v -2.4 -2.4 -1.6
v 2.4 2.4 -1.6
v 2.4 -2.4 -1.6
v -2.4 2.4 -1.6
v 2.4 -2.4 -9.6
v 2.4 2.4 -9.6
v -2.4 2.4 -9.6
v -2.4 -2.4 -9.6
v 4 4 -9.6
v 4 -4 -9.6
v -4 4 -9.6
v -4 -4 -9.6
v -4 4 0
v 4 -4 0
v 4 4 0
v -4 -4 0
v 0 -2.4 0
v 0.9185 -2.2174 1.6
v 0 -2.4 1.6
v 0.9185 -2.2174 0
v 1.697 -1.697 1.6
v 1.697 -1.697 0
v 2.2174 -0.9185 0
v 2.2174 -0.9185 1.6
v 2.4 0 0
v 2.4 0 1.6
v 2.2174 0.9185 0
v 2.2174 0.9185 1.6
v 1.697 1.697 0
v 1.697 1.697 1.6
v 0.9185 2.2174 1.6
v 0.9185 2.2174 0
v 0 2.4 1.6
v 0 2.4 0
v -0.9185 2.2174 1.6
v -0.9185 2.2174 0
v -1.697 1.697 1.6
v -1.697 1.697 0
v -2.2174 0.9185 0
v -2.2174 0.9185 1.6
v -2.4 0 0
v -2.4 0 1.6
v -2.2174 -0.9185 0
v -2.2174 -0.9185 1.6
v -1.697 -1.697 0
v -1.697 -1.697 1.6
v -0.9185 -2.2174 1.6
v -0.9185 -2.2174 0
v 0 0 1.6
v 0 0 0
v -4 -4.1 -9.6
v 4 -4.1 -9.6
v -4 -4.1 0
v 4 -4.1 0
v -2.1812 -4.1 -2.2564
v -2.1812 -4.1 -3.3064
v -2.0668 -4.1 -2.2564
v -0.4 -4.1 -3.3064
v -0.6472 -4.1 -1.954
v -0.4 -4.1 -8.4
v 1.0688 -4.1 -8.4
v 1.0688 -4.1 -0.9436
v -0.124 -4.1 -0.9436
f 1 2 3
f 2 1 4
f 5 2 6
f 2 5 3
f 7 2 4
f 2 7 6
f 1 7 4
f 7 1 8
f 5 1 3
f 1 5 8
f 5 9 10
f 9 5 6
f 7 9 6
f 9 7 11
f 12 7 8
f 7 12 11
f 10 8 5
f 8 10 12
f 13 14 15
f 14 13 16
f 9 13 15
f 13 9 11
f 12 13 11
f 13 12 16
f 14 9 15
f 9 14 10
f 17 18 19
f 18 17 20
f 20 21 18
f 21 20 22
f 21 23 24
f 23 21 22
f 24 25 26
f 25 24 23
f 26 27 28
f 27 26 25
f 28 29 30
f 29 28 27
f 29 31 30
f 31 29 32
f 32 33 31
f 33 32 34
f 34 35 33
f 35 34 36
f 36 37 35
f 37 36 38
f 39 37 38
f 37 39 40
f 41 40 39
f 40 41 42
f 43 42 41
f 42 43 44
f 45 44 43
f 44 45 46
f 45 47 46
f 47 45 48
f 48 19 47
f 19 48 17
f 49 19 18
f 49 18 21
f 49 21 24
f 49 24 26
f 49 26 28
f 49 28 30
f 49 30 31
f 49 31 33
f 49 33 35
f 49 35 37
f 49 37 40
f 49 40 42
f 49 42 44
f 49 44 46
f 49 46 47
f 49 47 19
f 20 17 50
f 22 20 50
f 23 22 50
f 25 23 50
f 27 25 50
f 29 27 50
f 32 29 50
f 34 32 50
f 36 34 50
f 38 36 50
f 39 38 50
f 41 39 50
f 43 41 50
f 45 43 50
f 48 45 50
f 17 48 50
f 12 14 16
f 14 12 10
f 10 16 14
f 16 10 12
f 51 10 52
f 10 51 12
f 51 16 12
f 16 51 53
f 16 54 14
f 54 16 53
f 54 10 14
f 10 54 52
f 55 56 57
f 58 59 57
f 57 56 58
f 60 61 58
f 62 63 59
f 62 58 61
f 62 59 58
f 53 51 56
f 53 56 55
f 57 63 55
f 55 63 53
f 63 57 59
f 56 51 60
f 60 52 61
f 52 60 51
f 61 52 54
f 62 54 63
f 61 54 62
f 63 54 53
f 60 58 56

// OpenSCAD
// file: ../p/4-4edge.scad
use <../lib.scad>
function ldraw_lib__4_4edge() = [
// 0 Circle 1.0
// 0 Name: 4-4edge.dat
// 0 Author: James Jessiman
// 0 !LDRAW_ORG Primitive UPDATE 2017-01
// 0 !LICENSE Licensed under CC BY 2.0 and CC BY 4.0 : see CAreadme.txt
// 
// 0 BFC CERTIFY CCW
  [0,"BFC","CERTIFY"],
  [0,"BFC","CCW"],
// 
// 0 !HISTORY 1998-12-15 [PTadmin] Official Update 1998-10
// 0 !HISTORY 2005-12-28 [PTadmin] Official Update 2005-01
// 0 !HISTORY 2007-06-24 [PTadmin] Header formatted for Contributor Agreement
// 0 !HISTORY 2008-07-01 [PTadmin] Official Update 2008-01
// 0 !HISTORY 2017-01-15 [Steffen] BFCed
// 0 !HISTORY 2017-12-30 [PTadmin] Official Update 2017-01
// 
// 
// 2 24 1 0 0 0.9239 0 0.3827
  [2,24,1,0,0,0.9239,0,0.3827],
// 2 24 0.9239 0 0.3827 0.7071 0 0.7071
  [2,24,0.9239,0,0.3827,0.7071,0,0.7071],
// 2 24 0.7071 0 0.7071 0.3827 0 0.9239
  [2,24,0.7071,0,0.7071,0.3827,0,0.9239],
// 2 24 0.3827 0 0.9239 0 0 1
  [2,24,0.3827,0,0.9239,0,0,1],
// 2 24 0 0 1 -0.3827 0 0.9239
  [2,24,0,0,1,-0.3827,0,0.9239],
// 2 24 -0.3827 0 0.9239 -0.7071 0 0.7071
  [2,24,-0.3827,0,0.9239,-0.7071,0,0.7071],
// 2 24 -0.7071 0 0.7071 -0.9239 0 0.3827
  [2,24,-0.7071,0,0.7071,-0.9239,0,0.3827],
// 2 24 -0.9239 0 0.3827 -1 0 -0
  [2,24,-0.9239,0,0.3827,-1,0,-0],
// 2 24 -1 0 -0 -0.9239 0 -0.3827
  [2,24,-1,0,-0,-0.9239,0,-0.3827],
// 2 24 -0.9239 0 -0.3827 -0.7071 0 -0.7071
  [2,24,-0.9239,0,-0.3827,-0.7071,0,-0.7071],
// 2 24 -0.7071 0 -0.7071 -0.3827 0 -0.9239
  [2,24,-0.7071,0,-0.7071,-0.3827,0,-0.9239],
// 2 24 -0.3827 0 -0.9239 0 0 -1
  [2,24,-0.3827,0,-0.9239,0,0,-1],
// 2 24 0 0 -1 0.3827 0 -0.9239
  [2,24,0,0,-1,0.3827,0,-0.9239],
// 2 24 0.3827 0 -0.9239 0.7071 0 -0.7071
  [2,24,0.3827,0,-0.9239,0.7071,0,-0.7071],
// 2 24 0.7071 0 -0.7071 0.9239 0 -0.3827
  [2,24,0.7071,0,-0.7071,0.9239,0,-0.3827],
// 2 24 0.9239 0 -0.3827 1 0 0
  [2,24,0.9239,0,-0.3827,1,0,0],
];
module ldraw_lib__4_4edge(step=0, col=false, unit=2/5, alt=false, line=0.2, solid=!$preview)
    makepoly(ldraw_lib__4_4edge(), step=step, col=col, unit=unit, alt=alt, line=line, solid=solid);
ldraw_lib__4_4edge(line=0.2);
// file: ../p/4-4disc.scad
use <../lib.scad>
function ldraw_lib__4_4disc() = [
// 0 Disc 1.0
// 0 Name: 4-4disc.dat
// 0 Author: James Jessiman
// 0 !LDRAW_ORG Primitive UPDATE 2002-02
// 0 !LICENSE Licensed under CC BY 2.0 and CC BY 4.0 : see CAreadme.txt
// 
// 0 BFC CERTIFY CCW
  [0,"BFC","CERTIFY"],
  [0,"BFC","CCW"],
// 
// 0 !HISTORY 1998-12-15 [PTadmin] Official Update 1998-10
// 0 !HISTORY 2002-03-23 [sbliss] Added BFC statement
// 0 !HISTORY 2002-04-25 [PTadmin] Official Update 2002-02
// 0 !HISTORY 2007-06-24 [PTadmin] Header formatted for Contributor Agreement
// 0 !HISTORY 2008-07-01 [PTadmin] Official Update 2008-01
// 
// 
// 3 16 0 0 0 1 0 0 0.9239 0 0.3827
  [3,16,0,0,0,1,0,0,0.9239,0,0.3827],
// 3 16 0 0 0 0.9239 0 0.3827 0.7071 0 0.7071
  [3,16,0,0,0,0.9239,0,0.3827,0.7071,0,0.7071],
// 3 16 0 0 0 0.7071 0 0.7071 0.3827 0 0.9239
  [3,16,0,0,0,0.7071,0,0.7071,0.3827,0,0.9239],
// 3 16 0 0 0 0.3827 0 0.9239 0 0 1
  [3,16,0,0,0,0.3827,0,0.9239,0,0,1],
// 3 16 0 0 0 0 0 1 -0.3827 0 0.9239
  [3,16,0,0,0,0,0,1,-0.3827,0,0.9239],
// 3 16 0 0 0 -0.3827 0 0.9239 -0.7071 0 0.7071
  [3,16,0,0,0,-0.3827,0,0.9239,-0.7071,0,0.7071],
// 3 16 0 0 0 -0.7071 0 0.7071 -0.9239 0 0.3827
  [3,16,0,0,0,-0.7071,0,0.7071,-0.9239,0,0.3827],
// 3 16 0 0 0 -0.9239 0 0.3827 -1 0 -0
  [3,16,0,0,0,-0.9239,0,0.3827,-1,0,-0],
// 3 16 0 0 0 -1 0 -0 -0.9239 0 -0.3827
  [3,16,0,0,0,-1,0,-0,-0.9239,0,-0.3827],
// 3 16 0 0 0 -0.9239 0 -0.3827 -0.7071 0 -0.7071
  [3,16,0,0,0,-0.9239,0,-0.3827,-0.7071,0,-0.7071],
// 3 16 0 0 0 -0.7071 0 -0.7071 -0.3827 0 -0.9239
  [3,16,0,0,0,-0.7071,0,-0.7071,-0.3827,0,-0.9239],
// 3 16 0 0 0 -0.3827 0 -0.9239 0 0 -1
  [3,16,0,0,0,-0.3827,0,-0.9239,0,0,-1],
// 3 16 0 0 0 0 0 -1 0.3827 0 -0.9239
  [3,16,0,0,0,0,0,-1,0.3827,0,-0.9239],
// 3 16 0 0 0 0.3827 0 -0.9239 0.7071 0 -0.7071
  [3,16,0,0,0,0.3827,0,-0.9239,0.7071,0,-0.7071],
// 3 16 0 0 0 0.7071 0 -0.7071 0.9239 0 -0.3827
  [3,16,0,0,0,0.7071,0,-0.7071,0.9239,0,-0.3827],
// 3 16 0 0 0 0.9239 0 -0.3827 1 0 0
  [3,16,0,0,0,0.9239,0,-0.3827,1,0,0],
// 0
];
module ldraw_lib__4_4disc(step=0, col=false, unit=2/5, alt=false, line=0.2, solid=!$preview)
    makepoly(ldraw_lib__4_4disc(), step=step, col=col, unit=unit, alt=alt, line=line, solid=solid);
ldraw_lib__4_4disc(line=0.2);
// file: ../p/4-4cyli.scad
use <../lib.scad>
$fa=1; $fs=0.2;
function ldraw_lib__4_4cyli(realsolid=false) = [
// 0 Cylinder 1.0
// 0 Name: 4-4cyli.dat
// 0 Author: James Jessiman
// 0 !LDRAW_ORG Primitive UPDATE 2005-01
// 0 !LICENSE Licensed under CC BY 2.0 and CC BY 4.0 : see CAreadme.txt
// 
// 0 BFC CERTIFY CCW
  [0,"BFC","CERTIFY"],
  [0,"BFC","CCW"],
// 
// 0 !HISTORY 1998-12-15 [PTadmin] Official Update 1998-10
// 0 !HISTORY 2002-03-23 [sbliss] Added BFC statement; merged headers from files in distributions LDraw 0.27 and Complete.
// 0 !HISTORY 2002-04-25 [PTadmin] Official Update 2002-02
// 0 !HISTORY 2004-12-14 [guyvivan] BFC CCW
// 0 !HISTORY 2005-12-28 [PTadmin] Official Update 2005-01
// 0 !HISTORY 2007-06-24 [PTadmin] Header formatted for Contributor Agreement
// 0 !HISTORY 2008-07-01 [PTadmin] Official Update 2008-01
// 
// 
// 4 16 1 1 0 0.9239 1 0.3827 0.9239 0 0.3827 1 0 0
  [4,16,1,1,0,0.9239,1,0.3827,0.9239,0,0.3827,1,0,0],
// 5 24 1 0 0 1 1 0 0.9239 0 0.3827 0.9239 0 -0.3827
  [5,24,1,0,0,1,1,0,0.9239,0,0.3827,0.9239,0,-0.3827],
// 4 16 0.9239 1 0.3827 0.7071 1 0.7071 0.7071 0 0.7071 0.9239 0 0.3827
  [4,16,0.9239,1,0.3827,0.7071,1,0.7071,0.7071,0,0.7071,0.9239,0,0.3827],
// 5 24 0.9239 0 0.3827 0.9239 1 0.3827 0.7071 0 0.7071 1 0 0
  [5,24,0.9239,0,0.3827,0.9239,1,0.3827,0.7071,0,0.7071,1,0,0],
// 4 16 0.7071 1 0.7071 0.3827 1 0.9239 0.3827 0 0.9239 0.7071 0 0.7071
  [4,16,0.7071,1,0.7071,0.3827,1,0.9239,0.3827,0,0.9239,0.7071,0,0.7071],
// 5 24 0.7071 0 0.7071 0.7071 1 0.7071 0.3827 0 0.9239 0.9239 0 0.3827
  [5,24,0.7071,0,0.7071,0.7071,1,0.7071,0.3827,0,0.9239,0.9239,0,0.3827],
// 4 16 0.3827 1 0.9239 0 1 1 0 0 1 0.3827 0 0.9239
  [4,16,0.3827,1,0.9239,0,1,1,0,0,1,0.3827,0,0.9239],
// 5 24 0.3827 0 0.9239 0.3827 1 0.9239 0 0 1 0.7071 0 0.7071
  [5,24,0.3827,0,0.9239,0.3827,1,0.9239,0,0,1,0.7071,0,0.7071],
// 4 16 0 1 1 -0.3827 1 0.9239 -0.3827 0 0.9239 0 0 1
  [4,16,0,1,1,-0.3827,1,0.9239,-0.3827,0,0.9239,0,0,1],
// 5 24 0 0 1 0 1 1 -0.3827 0 0.9239 0.3827 0 0.9239
  [5,24,0,0,1,0,1,1,-0.3827,0,0.9239,0.3827,0,0.9239],
// 4 16 -0.3827 1 0.9239 -0.7071 1 0.7071 -0.7071 0 0.7071 -0.3827 0 0.9239
  [4,16,-0.3827,1,0.9239,-0.7071,1,0.7071,-0.7071,0,0.7071,-0.3827,0,0.9239],
// 5 24 -0.3827 0 0.9239 -0.3827 1 0.9239 -0.7071 0 0.7071 0 0 1
  [5,24,-0.3827,0,0.9239,-0.3827,1,0.9239,-0.7071,0,0.7071,0,0,1],
// 4 16 -0.7071 1 0.7071 -0.9239 1 0.3827 -0.9239 0 0.3827 -0.7071 0 0.7071
  [4,16,-0.7071,1,0.7071,-0.9239,1,0.3827,-0.9239,0,0.3827,-0.7071,0,0.7071],
// 5 24 -0.7071 0 0.7071 -0.7071 1 0.7071 -0.9239 0 0.3827 -0.3827 0 0.9239
  [5,24,-0.7071,0,0.7071,-0.7071,1,0.7071,-0.9239,0,0.3827,-0.3827,0,0.9239],
// 4 16 -0.9239 1 0.3827 -1 1 0 -1 0 0 -0.9239 0 0.3827
  [4,16,-0.9239,1,0.3827,-1,1,0,-1,0,0,-0.9239,0,0.3827],
// 5 24 -0.9239 0 0.3827 -0.9239 1 0.3827 -1 0 0 -0.7071 0 0.7071
  [5,24,-0.9239,0,0.3827,-0.9239,1,0.3827,-1,0,0,-0.7071,0,0.7071],
// 4 16 -1 1 0 -0.9239 1 -0.3827 -0.9239 0 -0.3827 -1 0 0
  [4,16,-1,1,0,-0.9239,1,-0.3827,-0.9239,0,-0.3827,-1,0,0],
// 5 24 -1 0 0 -1 1 0 -0.9239 0 -0.3827 -0.9239 0 0.3827
  [5,24,-1,0,0,-1,1,0,-0.9239,0,-0.3827,-0.9239,0,0.3827],
// 4 16 -0.9239 1 -0.3827 -0.7071 1 -0.7071 -0.7071 0 -0.7071 -0.9239 0 -0.3827
  [4,16,-0.9239,1,-0.3827,-0.7071,1,-0.7071,-0.7071,0,-0.7071,-0.9239,0,-0.3827],
// 5 24 -0.9239 0 -0.3827 -0.9239 1 -0.3827 -0.7071 0 -0.7071 -1 0 0
  [5,24,-0.9239,0,-0.3827,-0.9239,1,-0.3827,-0.7071,0,-0.7071,-1,0,0],
// 4 16 -0.7071 1 -0.7071 -0.3827 1 -0.9239 -0.3827 0 -0.9239 -0.7071 0 -0.7071
  [4,16,-0.7071,1,-0.7071,-0.3827,1,-0.9239,-0.3827,0,-0.9239,-0.7071,0,-0.7071],
// 5 24 -0.7071 0 -0.7071 -0.7071 1 -0.7071 -0.3827 0 -0.9239 -0.9239 0 -0.3827
  [5,24,-0.7071,0,-0.7071,-0.7071,1,-0.7071,-0.3827,0,-0.9239,-0.9239,0,-0.3827],
// 4 16 -0.3827 1 -0.9239 0 1 -1 0 0 -1 -0.3827 0 -0.9239
  [4,16,-0.3827,1,-0.9239,0,1,-1,0,0,-1,-0.3827,0,-0.9239],
// 5 24 -0.3827 0 -0.9239 -0.3827 1 -0.9239 0 0 -1 -0.7071 0 -0.7071
  [5,24,-0.3827,0,-0.9239,-0.3827,1,-0.9239,0,0,-1,-0.7071,0,-0.7071],
// 4 16 0 1 -1 0.3827 1 -0.9239 0.3827 0 -0.9239 0 0 -1
  [4,16,0,1,-1,0.3827,1,-0.9239,0.3827,0,-0.9239,0,0,-1],
// 5 24 0 0 -1 0 1 -1 0.3827 0 -0.9239 -0.3827 0 -0.9239
  [5,24,0,0,-1,0,1,-1,0.3827,0,-0.9239,-0.3827,0,-0.9239],
// 4 16 0.3827 1 -0.9239 0.7071 1 -0.7071 0.7071 0 -0.7071 0.3827 0 -0.9239
  [4,16,0.3827,1,-0.9239,0.7071,1,-0.7071,0.7071,0,-0.7071,0.3827,0,-0.9239],
// 5 24 0.3827 0 -0.9239 0.3827 1 -0.9239 0.7071 0 -0.7071 0 0 -1
  [5,24,0.3827,0,-0.9239,0.3827,1,-0.9239,0.7071,0,-0.7071,0,0,-1],
// 4 16 0.7071 1 -0.7071 0.9239 1 -0.3827 0.9239 0 -0.3827 0.7071 0 -0.7071
  [4,16,0.7071,1,-0.7071,0.9239,1,-0.3827,0.9239,0,-0.3827,0.7071,0,-0.7071],
// 5 24 0.7071 0 -0.7071 0.7071 1 -0.7071 0.9239 0 -0.3827 0.3827 0 -0.9239
  [5,24,0.7071,0,-0.7071,0.7071,1,-0.7071,0.9239,0,-0.3827,0.3827,0,-0.9239],
// 4 16 0.9239 1 -0.3827 1 1 0 1 0 0 0.9239 0 -0.3827
  [4,16,0.9239,1,-0.3827,1,1,0,1,0,0,0.9239,0,-0.3827],
// 5 24 0.9239 0 -0.3827 0.9239 1 -0.3827 1 0 0 0.7071 0 -0.7071
  [5,24,0.9239,0,-0.3827,0.9239,1,-0.3827,1,0,0,0.7071,0,-0.7071],
// 0
];
module ldraw_lib__4_4cyli(step=0, col=false, unit=2/5, alt=false, line=0.2, solid=!$preview)
    makepoly(ldraw_lib__4_4cyli(solid), step=step, col=col, unit=unit, alt=alt, line=line, solid=solid);
ldraw_lib__4_4cyli(line=0.2);
// file: ../p/stud.scad
use <../lib.scad>
use <4-4cyli.scad>
use <4-4disc.scad>
use <4-4edge.scad>
function ldraw_lib__stud() = [
// 0 Stud
// 0 Name: stud.dat
// 0 Author: James Jessiman
// 0 !LDRAW_ORG Primitive UPDATE 2012-01
// 0 !LICENSE Licensed under CC BY 4.0 : see CAreadme.txt
// 
// 0 BFC CERTIFY CCW
  [0,"BFC","CERTIFY"],
  [0,"BFC","CCW"],
// 
// 0 !HISTORY 2002-04-04 [sbliss] Modified for BFC compliance
// 0 !HISTORY 2002-04-25 [PTadmin] Official Update 2002-02
// 0 !HISTORY 2007-06-24 [PTadmin] Header formatted for Contributor Agreement
// 0 !HISTORY 2008-07-01 [PTadmin] Official Update 2008-01
// 0 !HISTORY 2012-02-16 [Philo] Changed to CCW
// 0 !HISTORY 2012-03-30 [PTadmin] Official Update 2012-01
// 
// 
// 1 16 0 0 0 6 0 0 0 1 0 0 0 6 4-4edge.dat
  [1,16,0,0,0,6,0,0,0,1,0,0,0,6, ldraw_lib__4_4edge()],
// 1 16 0 -4 0 6 0 0 0 1 0 0 0 6 4-4edge.dat
  [1,16,0,-4,0,6,0,0,0,1,0,0,0,6, ldraw_lib__4_4edge()],
// 1 16 0 0 0 6 0 0 0 -4 0 0 0 6 4-4cyli.dat
  [1,16,0,0,0,6,0,0,0,-4,0,0,0,6, ldraw_lib__4_4cyli()],
// 1 16 0 -4 0 6 0 0 0 1 0 0 0 6 4-4disc.dat
  [1,16,0,-4,0,6,0,0,0,1,0,0,0,6, ldraw_lib__4_4disc()],
  [-1,16,0,0,0,6,0,0,0,-1,0,0,0,6, ldraw_lib__4_4disc()],
];
module ldraw_lib__stud(step=0, col=false, unit=2/5, alt=false, line=0.2, solid=!$preview)
    makepoly(ldraw_lib__stud(), step=step, col=col, unit=unit, alt=alt, line=line, solid=solid);
ldraw_lib__stud(line=0.2);
// file: ../p/box5.scad
use <../lib.scad>
function ldraw_lib__box5() = [
// 0 Box with 5 Faces and All Edges
// 0 Name: box5.dat
// 0 Author: James Jessiman
// 0 !LDRAW_ORG Primitive UPDATE 2012-01
// 0 !LICENSE Licensed under CC BY 2.0 and CC BY 4.0 : see CAreadme.txt
// 
// 0 BFC CERTIFY CCW
  [0,"BFC","CERTIFY"],
  [0,"BFC","CCW"],
// 
// 0 !HISTORY 2002-04-03 [sbliss] Modified for BFC compliance
// 0 !HISTORY 2002-04-25 [PTadmin] Official Update 2002-02
// 0 !HISTORY 2007-06-24 [PTadmin] Header formatted for Contributor Agreement
// 0 !HISTORY 2008-07-01 [PTadmin] Official Update 2008-01
// 0 !HISTORY 2012-02-16 [Philo] Changed to CCW
// 0 !HISTORY 2012-03-30 [PTadmin] Official Update 2012-01
// 
// 
// 2 24 1 1 1 -1 1 1
  [2,24,1,1,1,-1,1,1],
// 2 24 -1 1 1 -1 1 -1
  [2,24,-1,1,1,-1,1,-1],
// 2 24 -1 1 -1 1 1 -1
  [2,24,-1,1,-1,1,1,-1],
// 2 24 1 1 -1 1 1 1
  [2,24,1,1,-1,1,1,1],
// 2 24 1 0 1 -1 0 1
  [2,24,1,0,1,-1,0,1],
// 2 24 -1 0 1 -1 0 -1
  [2,24,-1,0,1,-1,0,-1],
// 2 24 -1 0 -1 1 0 -1
  [2,24,-1,0,-1,1,0,-1],
// 2 24 1 0 -1 1 0 1
  [2,24,1,0,-1,1,0,1],
// 2 24 1 0 1 1 1 1
  [2,24,1,0,1,1,1,1],
// 2 24 -1 0 1 -1 1 1
  [2,24,-1,0,1,-1,1,1],
// 2 24 1 0 -1 1 1 -1
  [2,24,1,0,-1,1,1,-1],
// 2 24 -1 0 -1 -1 1 -1
  [2,24,-1,0,-1,-1,1,-1],
// 4 16 -1 1 1 1 1 1 1 1 -1 -1 1 -1
  [4,16,-1,1,1,1,1,1,1,1,-1,-1,1,-1],
// 4 16 -1 1 1 -1 0 1 1 0 1 1 1 1
  [4,16,-1,1,1,-1,0,1,1,0,1,1,1,1],
// 4 16 -1 1 -1 -1 0 -1 -1 0 1 -1 1 1
  [4,16,-1,1,-1,-1,0,-1,-1,0,1,-1,1,1],
// 4 16 1 1 -1 1 0 -1 -1 0 -1 -1 1 -1
  [4,16,1,1,-1,1,0,-1,-1,0,-1,-1,1,-1],
// 4 16 1 1 1 1 0 1 1 0 -1 1 1 -1
  [4,16,1,1,1,1,0,1,1,0,-1,1,1,-1],
];
makepoly(ldraw_lib__box5(), line=0.2);
// file: ../p/box4t.scad
use <../lib.scad>
function ldraw_lib__box4t() = [
// 0 Box with 4 Adjacent Faces and All Edges
// 0 Name: box4t.dat
// 0 Author: Tore Eriksson [Tore_Eriksson]
// 0 !LDRAW_ORG Primitive UPDATE 2003-02
// 0 !LICENSE Licensed under CC BY 2.0 and CC BY 4.0 : see CAreadme.txt
// 
// 0 BFC CERTIFY CCW
  [0,"BFC","CERTIFY"],
  [0,"BFC","CCW"],
// 
// 0 !HISTORY 1997-09-29 [PTadmin] Official Update 1997-15
// 0 !HISTORY 2002-08-31 [izanette] Modified with WINDZ for BFC compliance
// 0 !HISTORY 2003-08-01 [PTadmin] Official Update 2003-02
// 0 !HISTORY 2007-06-24 [PTadmin] Header formatted for Contributor Agreement
// 0 !HISTORY 2008-07-01 [PTadmin] Official Update 2008-01
// 
// 
// 2 24 1 1 1 -1 1 1
  [2,24,1,1,1,-1,1,1],
// 2 24 -1 1 1 -1 1 -1
  [2,24,-1,1,1,-1,1,-1],
// 2 24 -1 1 -1 1 1 -1
  [2,24,-1,1,-1,1,1,-1],
// 2 24 1 1 -1 1 1 1
  [2,24,1,1,-1,1,1,1],
// 2 24 1 0 1 -1 0 1
  [2,24,1,0,1,-1,0,1],
// 2 24 -1 0 1 -1 0 -1
  [2,24,-1,0,1,-1,0,-1],
// 2 24 -1 0 -1 1 0 -1
  [2,24,-1,0,-1,1,0,-1],
// 2 24 1 0 -1 1 0 1
  [2,24,1,0,-1,1,0,1],
// 2 24 1 0 1 1 1 1
  [2,24,1,0,1,1,1,1],
// 2 24 -1 0 1 -1 1 1
  [2,24,-1,0,1,-1,1,1],
// 2 24 1 0 -1 1 1 -1
  [2,24,1,0,-1,1,1,-1],
// 2 24 -1 0 -1 -1 1 -1
  [2,24,-1,0,-1,-1,1,-1],
// 4 16 1 1 1 1 1 -1 -1 1 -1 -1 1 1
  [4,16,1,1,1,1,1,-1,-1,1,-1,-1,1,1],
// 4 16 1 1 1 -1 1 1 -1 0 1 1 0 1
  [4,16,1,1,1,-1,1,1,-1,0,1,1,0,1],
// 4 16 -1 1 1 -1 1 -1 -1 0 -1 -1 0 1
  [4,16,-1,1,1,-1,1,-1,-1,0,-1,-1,0,1],
// 0 4 16 -1 1 -1 -1 0 -1 1 0 -1 1 1 -1
// 4 16 1 1 -1 1 1 1 1 0 1 1 0 -1
  [4,16,1,1,-1,1,1,1,1,0,1,1,0,-1],
// 0
];
makepoly(ldraw_lib__box4t(), line=0.2);
// file: s/3005s01.scad
use <../../lib.scad>
use <../../p/box4t.scad>
use <../../p/box5.scad>
use <../../p/stud.scad>
function ldraw_lib__s__3005s01() = [
// 0 ~Brick  1 x  1 without Front Face
// 0 Name: s\3005s01.dat
// 0 Author: John Riley [jriley]
// 0 !LDRAW_ORG Subpart UPDATE 2004-01
// 0 !LICENSE Licensed under CC BY 2.0 and CC BY 4.0 : see CAreadme.txt
// 
// 0 BFC CERTIFY CCW
  [0,"BFC","CERTIFY"],
  [0,"BFC","CCW"],
// 
// 0 !HISTORY 2003-09-07 [jriley] BFCed & Subfiled
// 0 !HISTORY 2004-03-02 [PTadmin] Official Update 2004-01
// 0 !HISTORY 2007-08-29 [PTadmin] Header formatted for Contributor Agreement
// 0 !HISTORY 2008-07-01 [PTadmin] Official Update 2008-01
// 
// 
// 0 BFC INVERTNEXT
  [0,"BFC","INVERTNEXT"],
// 1 16 0 24 0 0 0 6 0 -20 0 -6 0 0 box5.dat
  [1,16,0,24,0,0,0,6,0,-20,0,-6,0,0, ldraw_lib__box5()],
// 4 16 10 24 -10 6 24 -6 6 24 6 10 24 10
  [4,16,10,24,-10,6,24,-6,6,24,6,10,24,10],
// 4 16 10 24 10 6 24 6 -6 24 6 -10 24 10
  [4,16,10,24,10,6,24,6,-6,24,6,-10,24,10],
// 4 16 -10 24 10 -6 24 6 -6 24 -6 -10 24 -10
  [4,16,-10,24,10,-6,24,6,-6,24,-6,-10,24,-10],
// 4 16 -10 24 -10 -6 24 -6 6 24 -6 10 24 -10
  [4,16,-10,24,-10,-6,24,-6,6,24,-6,10,24,-10],
// 1 16 0 24 0 10 0 0 0 -24 0 0 0 10 box4t.dat
  [1,16,0,24,0,10,0,0,0,-24,0,0,0,10, ldraw_lib__box4t()],
// 1 16 0 0 0 0 0 1 0 1 0 -1 0 0 stud.dat
  [1,16,0,0,0,0,0,1,0,1,0,-1,0,0, ldraw_lib__stud()],
// 0
];
module ldraw_lib__s__3005s01(step=0, col=false, unit=2/5, alt=false, line=0.2, solid=!$preview)
    makepoly(ldraw_lib__s__3005s01(), step=step, col=col, unit=unit, alt=alt, line=line, solid=solid);
ldraw_lib__s__3005s01(line=0.2);
// file: ../p/box5-12.scad
use <../lib.scad>
function ldraw_lib__box5_12() = [
// 0 Box with 5 Faces without Any Edges
// 0 Name: box5-12.dat
// 0 Author: Chris Dee [cwdee]
// 0 !LDRAW_ORG Primitive UPDATE 2009-02
// 0 !LICENSE Licensed under CC BY 2.0 and CC BY 4.0 : see CAreadme.txt
// 
// 0 BFC CERTIFY CCW
  [0,"BFC","CERTIFY"],
  [0,"BFC","CCW"],
// 
// 0 !HISTORY 2009-09-03 [PTadmin] Official Update 2009-02
// 
// 
// 4 16 1 1 1 1 1 -1 -1 1 -1 -1 1 1
  [4,16,1,1,1,1,1,-1,-1,1,-1,-1,1,1],
// 4 16 -1 0 1 1 0 1 1 1 1 -1 1 1
  [4,16,-1,0,1,1,0,1,1,1,1,-1,1,1],
// 4 16 -1 0 -1 -1 0 1 -1 1 1 -1 1 -1
  [4,16,-1,0,-1,-1,0,1,-1,1,1,-1,1,-1],
// 4 16 1 0 -1 -1 0 -1 -1 1 -1 1 1 -1
  [4,16,1,0,-1,-1,0,-1,-1,1,-1,1,1,-1],
// 4 16 1 0 1 1 0 -1 1 1 -1 1 1 1
  [4,16,1,0,1,1,0,-1,1,1,-1,1,1,1],
// 0
];
module ldraw_lib__box5_12(step=0, col=false, unit=2/5, alt=false, line=0.2, solid=!$preview)
    makepoly(ldraw_lib__box5_12(), step=step, col=col, unit=unit, alt=alt, line=line, solid=solid);
ldraw_lib__box5_12(line=0.2);
// file: 3005.scad
use <../lib.scad>
use <s/3005s01.scad>
function ldraw_lib__3005() = [
// 0 Brick  1 x  1
// 0 Name: 3005.dat
// 0 Author: James Jessiman
// 0 !LDRAW_ORG Part UPDATE 2022-05
// 0 !LICENSE Licensed under CC BY 2.0 and CC BY 4.0 : see CAreadme.txt
// 
// 0 BFC CERTIFY CCW
  [0,"BFC","CERTIFY"],
  [0,"BFC","CCW"],
// 
// 0 !HISTORY 2001-10-26 [PTadmin] Official Update 2001-01
// 0 !HISTORY 2002-05-07 {unknown} BFC Certification
// 0 !HISTORY 2002-06-11 [PTadmin] Official Update 2002-03
// 0 !HISTORY 2007-05-07 [PTadmin] Header formatted for Contributor Agreement
// 0 !HISTORY 2008-07-01 [PTadmin] Official Update 2008-01
// 0 !HISTORY 2022-08-04 [MagFors] Using subfile
// 0 !HISTORY 2022-09-15 [PTadmin] Official Update 2022-05
// 
// 
// 1 16 0 0 0 1 0 0 0 1 0 0 0 1 s\3005s01.dat
  [1,16,0,0,0,1,0,0,0,1,0,0,0,1, ldraw_lib__s__3005s01()],
// 4 16 -10 24 -10 10 24 -10 10 0 -10 -10 0 -10
  [4,16,-10,24,-10,10,24,-10,10,0,-10,-10,0,-10],
];
module ldraw_lib__3005(step=0, col=false, unit=2/5, alt=false, line=0.2, solid=!$preview)
    makepoly(ldraw_lib__3005(), step=step, col=col, unit=unit, alt=alt, line=line, solid=solid);
ldraw_lib__3005(line=0.2);
// file: 191888c.scad
use <../lib.scad>
use <../p/box5-12.scad>
function ldraw_lib__191888c() = [
// 0 Sticker  1.2 x  1 with White "1"
// 0 Name: 191888c.dat
// 0 Author: Steffen [Steffen]
// 0 !LDRAW_ORG Part UPDATE 2012-01
// 0 !LICENSE Licensed under CC BY 4.0 : see CAreadme.txt
// 
// 0 BFC CERTIFY CCW
  [0,"BFC","CERTIFY"],
  [0,"BFC","CCW"],
// 
// 0 !KEYWORDS set 7710
// 
// 0 !HISTORY 2012-03-30 [PTadmin] Official Update 2012-01
// 
// 
// 1 16 0 -0.25 0 10 0 0 0 0.25 0 0 0 -12 box5-12.dat
  [1,16,0,-0.25,0,10,0,0,0,0.25,0,0,0,-12, ldraw_lib__box5_12()],
// 3 15 -5.453 -0.25 6.359 -5.453 -0.25 3.734 -5.167 -0.25 6.359
  [3,15,-5.453,-0.25,6.359,-5.453,-0.25,3.734,-5.167,-0.25,6.359],
// 3 15 -1 -0.25 3.734 -1.618 -0.25 7.115 -5.167 -0.25 6.359
  [3,15,-1,-0.25,3.734,-1.618,-0.25,7.115,-5.167,-0.25,6.359],
// 3 15 -5.167 -0.25 6.359 -5.453 -0.25 3.734 -1 -0.25 3.734
  [3,15,-5.167,-0.25,6.359,-5.453,-0.25,3.734,-1,-0.25,3.734],
// 3 15 -1 -0.25 -9 2.672 -0.25 -9 -1 -0.25 3.734
  [3,15,-1,-0.25,-9,2.672,-0.25,-9,-1,-0.25,3.734],
// 3 15 2.672 -0.25 9.641 -0.31 -0.25 9.641 -1.618 -0.25 7.115
  [3,15,2.672,-0.25,9.641,-0.31,-0.25,9.641,-1.618,-0.25,7.115],
// 3 15 2.672 -0.25 9.641 -1 -0.25 3.734 2.672 -0.25 -9
  [3,15,2.672,-0.25,9.641,-1,-0.25,3.734,2.672,-0.25,-9],
// 3 15 2.672 -0.25 9.641 -1.618 -0.25 7.115 -1 -0.25 3.734
  [3,15,2.672,-0.25,9.641,-1.618,-0.25,7.115,-1,-0.25,3.734],
// 3 16 -10 -0.25 12 -10 -0.25 -12 -5.453 -0.25 3.734
  [3,16,-10,-0.25,12,-10,-0.25,-12,-5.453,-0.25,3.734],
// 3 16 -10 -0.25 12 -5.453 -0.25 3.734 -5.453 -0.25 6.359
  [3,16,-10,-0.25,12,-5.453,-0.25,3.734,-5.453,-0.25,6.359],
// 3 16 -5.167 -0.25 6.359 -0.31 -0.25 9.641 -5.453 -0.25 6.359
  [3,16,-5.167,-0.25,6.359,-0.31,-0.25,9.641,-5.453,-0.25,6.359],
// 3 16 -5.453 -0.25 6.359 -0.31 -0.25 9.641 -10 -0.25 12
  [3,16,-5.453,-0.25,6.359,-0.31,-0.25,9.641,-10,-0.25,12],
// 3 16 -0.31 -0.25 9.641 -5.167 -0.25 6.359 -1.618 -0.25 7.115
  [3,16,-0.31,-0.25,9.641,-5.167,-0.25,6.359,-1.618,-0.25,7.115],
// 3 16 -5.453 -0.25 3.734 -10 -0.25 -12 -1 -0.25 -9
  [3,16,-5.453,-0.25,3.734,-10,-0.25,-12,-1,-0.25,-9],
// 3 16 -1 -0.25 -9 10 -0.25 -12 2.672 -0.25 -9
  [3,16,-1,-0.25,-9,10,-0.25,-12,2.672,-0.25,-9],
// 3 16 10 -0.25 -12 -1 -0.25 -9 -10 -0.25 -12
  [3,16,10,-0.25,-12,-1,-0.25,-9,-10,-0.25,-12],
// 3 16 2.672 -0.25 -9 10 -0.25 -12 10 -0.25 12
  [3,16,2.672,-0.25,-9,10,-0.25,-12,10,-0.25,12],
// 3 16 2.672 -0.25 9.641 10 -0.25 12 -0.31 -0.25 9.641
  [3,16,2.672,-0.25,9.641,10,-0.25,12,-0.31,-0.25,9.641],
// 3 16 2.672 -0.25 -9 10 -0.25 12 2.672 -0.25 9.641
  [3,16,2.672,-0.25,-9,10,-0.25,12,2.672,-0.25,9.641],
// 3 16 -0.31 -0.25 9.641 10 -0.25 12 -10 -0.25 12
  [3,16,-0.31,-0.25,9.641,10,-0.25,12,-10,-0.25,12],
// 3 16 -1 -0.25 -9 -1 -0.25 3.734 -5.453 -0.25 3.734
  [3,16,-1,-0.25,-9,-1,-0.25,3.734,-5.453,-0.25,3.734],
];
module ldraw_lib__191888c(step=0, col=false, unit=2/5, alt=false, line=0.2, solid=!$preview)
    makepoly(ldraw_lib__191888c(), step=step, col=col, unit=unit, alt=alt, line=line, solid=solid);
ldraw_lib__191888c(line=0.2);
// main file
use <../lib.scad>
use <191888c.scad>
use <3005.scad>
function ldraw_lib__3005d04() = [
// 0 Brick  1 x  1 with White "1" Sticker
// 0 Name: 3005d04.dat
// 0 Author: Takeshi Takahashi [RainbowDolphin]
// 0 !LDRAW_ORG Shortcut UPDATE 2024-06
// 0 !LICENSE Licensed under CC BY 4.0 : see CAreadme.txt
// 
// 0 BFC CERTIFY CCW
  [0,"BFC","CERTIFY"],
  [0,"BFC","CCW"],
// 
// 0 !CATEGORY Sticker Shortcut
// 0 !KEYWORDS Bricklink 3005pb009, set 7710, Train
// 
// 0 !HISTORY 2024-07-29 [OrionP] Official Update 2024-06
// 
// 1 16 0 0 0 1 0 0 0 1 0 0 0 1 3005.dat
  [1,16,0,0,0,1,0,0,0,1,0,0,0,1, ldraw_lib__3005()],
// 1 16 0 12 -10 1 0 0 0 0 -1 0 1 0 191888c.dat
  [1,16,0,12,-10,1,0,0,0,0,-1,0,1,0, ldraw_lib__191888c()],
];
module ldraw_lib__3005d04(step=0, col=false, unit=2/5, alt=false, line=0.2, solid=!$preview)
    makepoly(ldraw_lib__3005d04(), step=step, col=col, unit=unit, alt=alt, line=line, solid=solid);
ldraw_lib__3005d04(line=0.2);
